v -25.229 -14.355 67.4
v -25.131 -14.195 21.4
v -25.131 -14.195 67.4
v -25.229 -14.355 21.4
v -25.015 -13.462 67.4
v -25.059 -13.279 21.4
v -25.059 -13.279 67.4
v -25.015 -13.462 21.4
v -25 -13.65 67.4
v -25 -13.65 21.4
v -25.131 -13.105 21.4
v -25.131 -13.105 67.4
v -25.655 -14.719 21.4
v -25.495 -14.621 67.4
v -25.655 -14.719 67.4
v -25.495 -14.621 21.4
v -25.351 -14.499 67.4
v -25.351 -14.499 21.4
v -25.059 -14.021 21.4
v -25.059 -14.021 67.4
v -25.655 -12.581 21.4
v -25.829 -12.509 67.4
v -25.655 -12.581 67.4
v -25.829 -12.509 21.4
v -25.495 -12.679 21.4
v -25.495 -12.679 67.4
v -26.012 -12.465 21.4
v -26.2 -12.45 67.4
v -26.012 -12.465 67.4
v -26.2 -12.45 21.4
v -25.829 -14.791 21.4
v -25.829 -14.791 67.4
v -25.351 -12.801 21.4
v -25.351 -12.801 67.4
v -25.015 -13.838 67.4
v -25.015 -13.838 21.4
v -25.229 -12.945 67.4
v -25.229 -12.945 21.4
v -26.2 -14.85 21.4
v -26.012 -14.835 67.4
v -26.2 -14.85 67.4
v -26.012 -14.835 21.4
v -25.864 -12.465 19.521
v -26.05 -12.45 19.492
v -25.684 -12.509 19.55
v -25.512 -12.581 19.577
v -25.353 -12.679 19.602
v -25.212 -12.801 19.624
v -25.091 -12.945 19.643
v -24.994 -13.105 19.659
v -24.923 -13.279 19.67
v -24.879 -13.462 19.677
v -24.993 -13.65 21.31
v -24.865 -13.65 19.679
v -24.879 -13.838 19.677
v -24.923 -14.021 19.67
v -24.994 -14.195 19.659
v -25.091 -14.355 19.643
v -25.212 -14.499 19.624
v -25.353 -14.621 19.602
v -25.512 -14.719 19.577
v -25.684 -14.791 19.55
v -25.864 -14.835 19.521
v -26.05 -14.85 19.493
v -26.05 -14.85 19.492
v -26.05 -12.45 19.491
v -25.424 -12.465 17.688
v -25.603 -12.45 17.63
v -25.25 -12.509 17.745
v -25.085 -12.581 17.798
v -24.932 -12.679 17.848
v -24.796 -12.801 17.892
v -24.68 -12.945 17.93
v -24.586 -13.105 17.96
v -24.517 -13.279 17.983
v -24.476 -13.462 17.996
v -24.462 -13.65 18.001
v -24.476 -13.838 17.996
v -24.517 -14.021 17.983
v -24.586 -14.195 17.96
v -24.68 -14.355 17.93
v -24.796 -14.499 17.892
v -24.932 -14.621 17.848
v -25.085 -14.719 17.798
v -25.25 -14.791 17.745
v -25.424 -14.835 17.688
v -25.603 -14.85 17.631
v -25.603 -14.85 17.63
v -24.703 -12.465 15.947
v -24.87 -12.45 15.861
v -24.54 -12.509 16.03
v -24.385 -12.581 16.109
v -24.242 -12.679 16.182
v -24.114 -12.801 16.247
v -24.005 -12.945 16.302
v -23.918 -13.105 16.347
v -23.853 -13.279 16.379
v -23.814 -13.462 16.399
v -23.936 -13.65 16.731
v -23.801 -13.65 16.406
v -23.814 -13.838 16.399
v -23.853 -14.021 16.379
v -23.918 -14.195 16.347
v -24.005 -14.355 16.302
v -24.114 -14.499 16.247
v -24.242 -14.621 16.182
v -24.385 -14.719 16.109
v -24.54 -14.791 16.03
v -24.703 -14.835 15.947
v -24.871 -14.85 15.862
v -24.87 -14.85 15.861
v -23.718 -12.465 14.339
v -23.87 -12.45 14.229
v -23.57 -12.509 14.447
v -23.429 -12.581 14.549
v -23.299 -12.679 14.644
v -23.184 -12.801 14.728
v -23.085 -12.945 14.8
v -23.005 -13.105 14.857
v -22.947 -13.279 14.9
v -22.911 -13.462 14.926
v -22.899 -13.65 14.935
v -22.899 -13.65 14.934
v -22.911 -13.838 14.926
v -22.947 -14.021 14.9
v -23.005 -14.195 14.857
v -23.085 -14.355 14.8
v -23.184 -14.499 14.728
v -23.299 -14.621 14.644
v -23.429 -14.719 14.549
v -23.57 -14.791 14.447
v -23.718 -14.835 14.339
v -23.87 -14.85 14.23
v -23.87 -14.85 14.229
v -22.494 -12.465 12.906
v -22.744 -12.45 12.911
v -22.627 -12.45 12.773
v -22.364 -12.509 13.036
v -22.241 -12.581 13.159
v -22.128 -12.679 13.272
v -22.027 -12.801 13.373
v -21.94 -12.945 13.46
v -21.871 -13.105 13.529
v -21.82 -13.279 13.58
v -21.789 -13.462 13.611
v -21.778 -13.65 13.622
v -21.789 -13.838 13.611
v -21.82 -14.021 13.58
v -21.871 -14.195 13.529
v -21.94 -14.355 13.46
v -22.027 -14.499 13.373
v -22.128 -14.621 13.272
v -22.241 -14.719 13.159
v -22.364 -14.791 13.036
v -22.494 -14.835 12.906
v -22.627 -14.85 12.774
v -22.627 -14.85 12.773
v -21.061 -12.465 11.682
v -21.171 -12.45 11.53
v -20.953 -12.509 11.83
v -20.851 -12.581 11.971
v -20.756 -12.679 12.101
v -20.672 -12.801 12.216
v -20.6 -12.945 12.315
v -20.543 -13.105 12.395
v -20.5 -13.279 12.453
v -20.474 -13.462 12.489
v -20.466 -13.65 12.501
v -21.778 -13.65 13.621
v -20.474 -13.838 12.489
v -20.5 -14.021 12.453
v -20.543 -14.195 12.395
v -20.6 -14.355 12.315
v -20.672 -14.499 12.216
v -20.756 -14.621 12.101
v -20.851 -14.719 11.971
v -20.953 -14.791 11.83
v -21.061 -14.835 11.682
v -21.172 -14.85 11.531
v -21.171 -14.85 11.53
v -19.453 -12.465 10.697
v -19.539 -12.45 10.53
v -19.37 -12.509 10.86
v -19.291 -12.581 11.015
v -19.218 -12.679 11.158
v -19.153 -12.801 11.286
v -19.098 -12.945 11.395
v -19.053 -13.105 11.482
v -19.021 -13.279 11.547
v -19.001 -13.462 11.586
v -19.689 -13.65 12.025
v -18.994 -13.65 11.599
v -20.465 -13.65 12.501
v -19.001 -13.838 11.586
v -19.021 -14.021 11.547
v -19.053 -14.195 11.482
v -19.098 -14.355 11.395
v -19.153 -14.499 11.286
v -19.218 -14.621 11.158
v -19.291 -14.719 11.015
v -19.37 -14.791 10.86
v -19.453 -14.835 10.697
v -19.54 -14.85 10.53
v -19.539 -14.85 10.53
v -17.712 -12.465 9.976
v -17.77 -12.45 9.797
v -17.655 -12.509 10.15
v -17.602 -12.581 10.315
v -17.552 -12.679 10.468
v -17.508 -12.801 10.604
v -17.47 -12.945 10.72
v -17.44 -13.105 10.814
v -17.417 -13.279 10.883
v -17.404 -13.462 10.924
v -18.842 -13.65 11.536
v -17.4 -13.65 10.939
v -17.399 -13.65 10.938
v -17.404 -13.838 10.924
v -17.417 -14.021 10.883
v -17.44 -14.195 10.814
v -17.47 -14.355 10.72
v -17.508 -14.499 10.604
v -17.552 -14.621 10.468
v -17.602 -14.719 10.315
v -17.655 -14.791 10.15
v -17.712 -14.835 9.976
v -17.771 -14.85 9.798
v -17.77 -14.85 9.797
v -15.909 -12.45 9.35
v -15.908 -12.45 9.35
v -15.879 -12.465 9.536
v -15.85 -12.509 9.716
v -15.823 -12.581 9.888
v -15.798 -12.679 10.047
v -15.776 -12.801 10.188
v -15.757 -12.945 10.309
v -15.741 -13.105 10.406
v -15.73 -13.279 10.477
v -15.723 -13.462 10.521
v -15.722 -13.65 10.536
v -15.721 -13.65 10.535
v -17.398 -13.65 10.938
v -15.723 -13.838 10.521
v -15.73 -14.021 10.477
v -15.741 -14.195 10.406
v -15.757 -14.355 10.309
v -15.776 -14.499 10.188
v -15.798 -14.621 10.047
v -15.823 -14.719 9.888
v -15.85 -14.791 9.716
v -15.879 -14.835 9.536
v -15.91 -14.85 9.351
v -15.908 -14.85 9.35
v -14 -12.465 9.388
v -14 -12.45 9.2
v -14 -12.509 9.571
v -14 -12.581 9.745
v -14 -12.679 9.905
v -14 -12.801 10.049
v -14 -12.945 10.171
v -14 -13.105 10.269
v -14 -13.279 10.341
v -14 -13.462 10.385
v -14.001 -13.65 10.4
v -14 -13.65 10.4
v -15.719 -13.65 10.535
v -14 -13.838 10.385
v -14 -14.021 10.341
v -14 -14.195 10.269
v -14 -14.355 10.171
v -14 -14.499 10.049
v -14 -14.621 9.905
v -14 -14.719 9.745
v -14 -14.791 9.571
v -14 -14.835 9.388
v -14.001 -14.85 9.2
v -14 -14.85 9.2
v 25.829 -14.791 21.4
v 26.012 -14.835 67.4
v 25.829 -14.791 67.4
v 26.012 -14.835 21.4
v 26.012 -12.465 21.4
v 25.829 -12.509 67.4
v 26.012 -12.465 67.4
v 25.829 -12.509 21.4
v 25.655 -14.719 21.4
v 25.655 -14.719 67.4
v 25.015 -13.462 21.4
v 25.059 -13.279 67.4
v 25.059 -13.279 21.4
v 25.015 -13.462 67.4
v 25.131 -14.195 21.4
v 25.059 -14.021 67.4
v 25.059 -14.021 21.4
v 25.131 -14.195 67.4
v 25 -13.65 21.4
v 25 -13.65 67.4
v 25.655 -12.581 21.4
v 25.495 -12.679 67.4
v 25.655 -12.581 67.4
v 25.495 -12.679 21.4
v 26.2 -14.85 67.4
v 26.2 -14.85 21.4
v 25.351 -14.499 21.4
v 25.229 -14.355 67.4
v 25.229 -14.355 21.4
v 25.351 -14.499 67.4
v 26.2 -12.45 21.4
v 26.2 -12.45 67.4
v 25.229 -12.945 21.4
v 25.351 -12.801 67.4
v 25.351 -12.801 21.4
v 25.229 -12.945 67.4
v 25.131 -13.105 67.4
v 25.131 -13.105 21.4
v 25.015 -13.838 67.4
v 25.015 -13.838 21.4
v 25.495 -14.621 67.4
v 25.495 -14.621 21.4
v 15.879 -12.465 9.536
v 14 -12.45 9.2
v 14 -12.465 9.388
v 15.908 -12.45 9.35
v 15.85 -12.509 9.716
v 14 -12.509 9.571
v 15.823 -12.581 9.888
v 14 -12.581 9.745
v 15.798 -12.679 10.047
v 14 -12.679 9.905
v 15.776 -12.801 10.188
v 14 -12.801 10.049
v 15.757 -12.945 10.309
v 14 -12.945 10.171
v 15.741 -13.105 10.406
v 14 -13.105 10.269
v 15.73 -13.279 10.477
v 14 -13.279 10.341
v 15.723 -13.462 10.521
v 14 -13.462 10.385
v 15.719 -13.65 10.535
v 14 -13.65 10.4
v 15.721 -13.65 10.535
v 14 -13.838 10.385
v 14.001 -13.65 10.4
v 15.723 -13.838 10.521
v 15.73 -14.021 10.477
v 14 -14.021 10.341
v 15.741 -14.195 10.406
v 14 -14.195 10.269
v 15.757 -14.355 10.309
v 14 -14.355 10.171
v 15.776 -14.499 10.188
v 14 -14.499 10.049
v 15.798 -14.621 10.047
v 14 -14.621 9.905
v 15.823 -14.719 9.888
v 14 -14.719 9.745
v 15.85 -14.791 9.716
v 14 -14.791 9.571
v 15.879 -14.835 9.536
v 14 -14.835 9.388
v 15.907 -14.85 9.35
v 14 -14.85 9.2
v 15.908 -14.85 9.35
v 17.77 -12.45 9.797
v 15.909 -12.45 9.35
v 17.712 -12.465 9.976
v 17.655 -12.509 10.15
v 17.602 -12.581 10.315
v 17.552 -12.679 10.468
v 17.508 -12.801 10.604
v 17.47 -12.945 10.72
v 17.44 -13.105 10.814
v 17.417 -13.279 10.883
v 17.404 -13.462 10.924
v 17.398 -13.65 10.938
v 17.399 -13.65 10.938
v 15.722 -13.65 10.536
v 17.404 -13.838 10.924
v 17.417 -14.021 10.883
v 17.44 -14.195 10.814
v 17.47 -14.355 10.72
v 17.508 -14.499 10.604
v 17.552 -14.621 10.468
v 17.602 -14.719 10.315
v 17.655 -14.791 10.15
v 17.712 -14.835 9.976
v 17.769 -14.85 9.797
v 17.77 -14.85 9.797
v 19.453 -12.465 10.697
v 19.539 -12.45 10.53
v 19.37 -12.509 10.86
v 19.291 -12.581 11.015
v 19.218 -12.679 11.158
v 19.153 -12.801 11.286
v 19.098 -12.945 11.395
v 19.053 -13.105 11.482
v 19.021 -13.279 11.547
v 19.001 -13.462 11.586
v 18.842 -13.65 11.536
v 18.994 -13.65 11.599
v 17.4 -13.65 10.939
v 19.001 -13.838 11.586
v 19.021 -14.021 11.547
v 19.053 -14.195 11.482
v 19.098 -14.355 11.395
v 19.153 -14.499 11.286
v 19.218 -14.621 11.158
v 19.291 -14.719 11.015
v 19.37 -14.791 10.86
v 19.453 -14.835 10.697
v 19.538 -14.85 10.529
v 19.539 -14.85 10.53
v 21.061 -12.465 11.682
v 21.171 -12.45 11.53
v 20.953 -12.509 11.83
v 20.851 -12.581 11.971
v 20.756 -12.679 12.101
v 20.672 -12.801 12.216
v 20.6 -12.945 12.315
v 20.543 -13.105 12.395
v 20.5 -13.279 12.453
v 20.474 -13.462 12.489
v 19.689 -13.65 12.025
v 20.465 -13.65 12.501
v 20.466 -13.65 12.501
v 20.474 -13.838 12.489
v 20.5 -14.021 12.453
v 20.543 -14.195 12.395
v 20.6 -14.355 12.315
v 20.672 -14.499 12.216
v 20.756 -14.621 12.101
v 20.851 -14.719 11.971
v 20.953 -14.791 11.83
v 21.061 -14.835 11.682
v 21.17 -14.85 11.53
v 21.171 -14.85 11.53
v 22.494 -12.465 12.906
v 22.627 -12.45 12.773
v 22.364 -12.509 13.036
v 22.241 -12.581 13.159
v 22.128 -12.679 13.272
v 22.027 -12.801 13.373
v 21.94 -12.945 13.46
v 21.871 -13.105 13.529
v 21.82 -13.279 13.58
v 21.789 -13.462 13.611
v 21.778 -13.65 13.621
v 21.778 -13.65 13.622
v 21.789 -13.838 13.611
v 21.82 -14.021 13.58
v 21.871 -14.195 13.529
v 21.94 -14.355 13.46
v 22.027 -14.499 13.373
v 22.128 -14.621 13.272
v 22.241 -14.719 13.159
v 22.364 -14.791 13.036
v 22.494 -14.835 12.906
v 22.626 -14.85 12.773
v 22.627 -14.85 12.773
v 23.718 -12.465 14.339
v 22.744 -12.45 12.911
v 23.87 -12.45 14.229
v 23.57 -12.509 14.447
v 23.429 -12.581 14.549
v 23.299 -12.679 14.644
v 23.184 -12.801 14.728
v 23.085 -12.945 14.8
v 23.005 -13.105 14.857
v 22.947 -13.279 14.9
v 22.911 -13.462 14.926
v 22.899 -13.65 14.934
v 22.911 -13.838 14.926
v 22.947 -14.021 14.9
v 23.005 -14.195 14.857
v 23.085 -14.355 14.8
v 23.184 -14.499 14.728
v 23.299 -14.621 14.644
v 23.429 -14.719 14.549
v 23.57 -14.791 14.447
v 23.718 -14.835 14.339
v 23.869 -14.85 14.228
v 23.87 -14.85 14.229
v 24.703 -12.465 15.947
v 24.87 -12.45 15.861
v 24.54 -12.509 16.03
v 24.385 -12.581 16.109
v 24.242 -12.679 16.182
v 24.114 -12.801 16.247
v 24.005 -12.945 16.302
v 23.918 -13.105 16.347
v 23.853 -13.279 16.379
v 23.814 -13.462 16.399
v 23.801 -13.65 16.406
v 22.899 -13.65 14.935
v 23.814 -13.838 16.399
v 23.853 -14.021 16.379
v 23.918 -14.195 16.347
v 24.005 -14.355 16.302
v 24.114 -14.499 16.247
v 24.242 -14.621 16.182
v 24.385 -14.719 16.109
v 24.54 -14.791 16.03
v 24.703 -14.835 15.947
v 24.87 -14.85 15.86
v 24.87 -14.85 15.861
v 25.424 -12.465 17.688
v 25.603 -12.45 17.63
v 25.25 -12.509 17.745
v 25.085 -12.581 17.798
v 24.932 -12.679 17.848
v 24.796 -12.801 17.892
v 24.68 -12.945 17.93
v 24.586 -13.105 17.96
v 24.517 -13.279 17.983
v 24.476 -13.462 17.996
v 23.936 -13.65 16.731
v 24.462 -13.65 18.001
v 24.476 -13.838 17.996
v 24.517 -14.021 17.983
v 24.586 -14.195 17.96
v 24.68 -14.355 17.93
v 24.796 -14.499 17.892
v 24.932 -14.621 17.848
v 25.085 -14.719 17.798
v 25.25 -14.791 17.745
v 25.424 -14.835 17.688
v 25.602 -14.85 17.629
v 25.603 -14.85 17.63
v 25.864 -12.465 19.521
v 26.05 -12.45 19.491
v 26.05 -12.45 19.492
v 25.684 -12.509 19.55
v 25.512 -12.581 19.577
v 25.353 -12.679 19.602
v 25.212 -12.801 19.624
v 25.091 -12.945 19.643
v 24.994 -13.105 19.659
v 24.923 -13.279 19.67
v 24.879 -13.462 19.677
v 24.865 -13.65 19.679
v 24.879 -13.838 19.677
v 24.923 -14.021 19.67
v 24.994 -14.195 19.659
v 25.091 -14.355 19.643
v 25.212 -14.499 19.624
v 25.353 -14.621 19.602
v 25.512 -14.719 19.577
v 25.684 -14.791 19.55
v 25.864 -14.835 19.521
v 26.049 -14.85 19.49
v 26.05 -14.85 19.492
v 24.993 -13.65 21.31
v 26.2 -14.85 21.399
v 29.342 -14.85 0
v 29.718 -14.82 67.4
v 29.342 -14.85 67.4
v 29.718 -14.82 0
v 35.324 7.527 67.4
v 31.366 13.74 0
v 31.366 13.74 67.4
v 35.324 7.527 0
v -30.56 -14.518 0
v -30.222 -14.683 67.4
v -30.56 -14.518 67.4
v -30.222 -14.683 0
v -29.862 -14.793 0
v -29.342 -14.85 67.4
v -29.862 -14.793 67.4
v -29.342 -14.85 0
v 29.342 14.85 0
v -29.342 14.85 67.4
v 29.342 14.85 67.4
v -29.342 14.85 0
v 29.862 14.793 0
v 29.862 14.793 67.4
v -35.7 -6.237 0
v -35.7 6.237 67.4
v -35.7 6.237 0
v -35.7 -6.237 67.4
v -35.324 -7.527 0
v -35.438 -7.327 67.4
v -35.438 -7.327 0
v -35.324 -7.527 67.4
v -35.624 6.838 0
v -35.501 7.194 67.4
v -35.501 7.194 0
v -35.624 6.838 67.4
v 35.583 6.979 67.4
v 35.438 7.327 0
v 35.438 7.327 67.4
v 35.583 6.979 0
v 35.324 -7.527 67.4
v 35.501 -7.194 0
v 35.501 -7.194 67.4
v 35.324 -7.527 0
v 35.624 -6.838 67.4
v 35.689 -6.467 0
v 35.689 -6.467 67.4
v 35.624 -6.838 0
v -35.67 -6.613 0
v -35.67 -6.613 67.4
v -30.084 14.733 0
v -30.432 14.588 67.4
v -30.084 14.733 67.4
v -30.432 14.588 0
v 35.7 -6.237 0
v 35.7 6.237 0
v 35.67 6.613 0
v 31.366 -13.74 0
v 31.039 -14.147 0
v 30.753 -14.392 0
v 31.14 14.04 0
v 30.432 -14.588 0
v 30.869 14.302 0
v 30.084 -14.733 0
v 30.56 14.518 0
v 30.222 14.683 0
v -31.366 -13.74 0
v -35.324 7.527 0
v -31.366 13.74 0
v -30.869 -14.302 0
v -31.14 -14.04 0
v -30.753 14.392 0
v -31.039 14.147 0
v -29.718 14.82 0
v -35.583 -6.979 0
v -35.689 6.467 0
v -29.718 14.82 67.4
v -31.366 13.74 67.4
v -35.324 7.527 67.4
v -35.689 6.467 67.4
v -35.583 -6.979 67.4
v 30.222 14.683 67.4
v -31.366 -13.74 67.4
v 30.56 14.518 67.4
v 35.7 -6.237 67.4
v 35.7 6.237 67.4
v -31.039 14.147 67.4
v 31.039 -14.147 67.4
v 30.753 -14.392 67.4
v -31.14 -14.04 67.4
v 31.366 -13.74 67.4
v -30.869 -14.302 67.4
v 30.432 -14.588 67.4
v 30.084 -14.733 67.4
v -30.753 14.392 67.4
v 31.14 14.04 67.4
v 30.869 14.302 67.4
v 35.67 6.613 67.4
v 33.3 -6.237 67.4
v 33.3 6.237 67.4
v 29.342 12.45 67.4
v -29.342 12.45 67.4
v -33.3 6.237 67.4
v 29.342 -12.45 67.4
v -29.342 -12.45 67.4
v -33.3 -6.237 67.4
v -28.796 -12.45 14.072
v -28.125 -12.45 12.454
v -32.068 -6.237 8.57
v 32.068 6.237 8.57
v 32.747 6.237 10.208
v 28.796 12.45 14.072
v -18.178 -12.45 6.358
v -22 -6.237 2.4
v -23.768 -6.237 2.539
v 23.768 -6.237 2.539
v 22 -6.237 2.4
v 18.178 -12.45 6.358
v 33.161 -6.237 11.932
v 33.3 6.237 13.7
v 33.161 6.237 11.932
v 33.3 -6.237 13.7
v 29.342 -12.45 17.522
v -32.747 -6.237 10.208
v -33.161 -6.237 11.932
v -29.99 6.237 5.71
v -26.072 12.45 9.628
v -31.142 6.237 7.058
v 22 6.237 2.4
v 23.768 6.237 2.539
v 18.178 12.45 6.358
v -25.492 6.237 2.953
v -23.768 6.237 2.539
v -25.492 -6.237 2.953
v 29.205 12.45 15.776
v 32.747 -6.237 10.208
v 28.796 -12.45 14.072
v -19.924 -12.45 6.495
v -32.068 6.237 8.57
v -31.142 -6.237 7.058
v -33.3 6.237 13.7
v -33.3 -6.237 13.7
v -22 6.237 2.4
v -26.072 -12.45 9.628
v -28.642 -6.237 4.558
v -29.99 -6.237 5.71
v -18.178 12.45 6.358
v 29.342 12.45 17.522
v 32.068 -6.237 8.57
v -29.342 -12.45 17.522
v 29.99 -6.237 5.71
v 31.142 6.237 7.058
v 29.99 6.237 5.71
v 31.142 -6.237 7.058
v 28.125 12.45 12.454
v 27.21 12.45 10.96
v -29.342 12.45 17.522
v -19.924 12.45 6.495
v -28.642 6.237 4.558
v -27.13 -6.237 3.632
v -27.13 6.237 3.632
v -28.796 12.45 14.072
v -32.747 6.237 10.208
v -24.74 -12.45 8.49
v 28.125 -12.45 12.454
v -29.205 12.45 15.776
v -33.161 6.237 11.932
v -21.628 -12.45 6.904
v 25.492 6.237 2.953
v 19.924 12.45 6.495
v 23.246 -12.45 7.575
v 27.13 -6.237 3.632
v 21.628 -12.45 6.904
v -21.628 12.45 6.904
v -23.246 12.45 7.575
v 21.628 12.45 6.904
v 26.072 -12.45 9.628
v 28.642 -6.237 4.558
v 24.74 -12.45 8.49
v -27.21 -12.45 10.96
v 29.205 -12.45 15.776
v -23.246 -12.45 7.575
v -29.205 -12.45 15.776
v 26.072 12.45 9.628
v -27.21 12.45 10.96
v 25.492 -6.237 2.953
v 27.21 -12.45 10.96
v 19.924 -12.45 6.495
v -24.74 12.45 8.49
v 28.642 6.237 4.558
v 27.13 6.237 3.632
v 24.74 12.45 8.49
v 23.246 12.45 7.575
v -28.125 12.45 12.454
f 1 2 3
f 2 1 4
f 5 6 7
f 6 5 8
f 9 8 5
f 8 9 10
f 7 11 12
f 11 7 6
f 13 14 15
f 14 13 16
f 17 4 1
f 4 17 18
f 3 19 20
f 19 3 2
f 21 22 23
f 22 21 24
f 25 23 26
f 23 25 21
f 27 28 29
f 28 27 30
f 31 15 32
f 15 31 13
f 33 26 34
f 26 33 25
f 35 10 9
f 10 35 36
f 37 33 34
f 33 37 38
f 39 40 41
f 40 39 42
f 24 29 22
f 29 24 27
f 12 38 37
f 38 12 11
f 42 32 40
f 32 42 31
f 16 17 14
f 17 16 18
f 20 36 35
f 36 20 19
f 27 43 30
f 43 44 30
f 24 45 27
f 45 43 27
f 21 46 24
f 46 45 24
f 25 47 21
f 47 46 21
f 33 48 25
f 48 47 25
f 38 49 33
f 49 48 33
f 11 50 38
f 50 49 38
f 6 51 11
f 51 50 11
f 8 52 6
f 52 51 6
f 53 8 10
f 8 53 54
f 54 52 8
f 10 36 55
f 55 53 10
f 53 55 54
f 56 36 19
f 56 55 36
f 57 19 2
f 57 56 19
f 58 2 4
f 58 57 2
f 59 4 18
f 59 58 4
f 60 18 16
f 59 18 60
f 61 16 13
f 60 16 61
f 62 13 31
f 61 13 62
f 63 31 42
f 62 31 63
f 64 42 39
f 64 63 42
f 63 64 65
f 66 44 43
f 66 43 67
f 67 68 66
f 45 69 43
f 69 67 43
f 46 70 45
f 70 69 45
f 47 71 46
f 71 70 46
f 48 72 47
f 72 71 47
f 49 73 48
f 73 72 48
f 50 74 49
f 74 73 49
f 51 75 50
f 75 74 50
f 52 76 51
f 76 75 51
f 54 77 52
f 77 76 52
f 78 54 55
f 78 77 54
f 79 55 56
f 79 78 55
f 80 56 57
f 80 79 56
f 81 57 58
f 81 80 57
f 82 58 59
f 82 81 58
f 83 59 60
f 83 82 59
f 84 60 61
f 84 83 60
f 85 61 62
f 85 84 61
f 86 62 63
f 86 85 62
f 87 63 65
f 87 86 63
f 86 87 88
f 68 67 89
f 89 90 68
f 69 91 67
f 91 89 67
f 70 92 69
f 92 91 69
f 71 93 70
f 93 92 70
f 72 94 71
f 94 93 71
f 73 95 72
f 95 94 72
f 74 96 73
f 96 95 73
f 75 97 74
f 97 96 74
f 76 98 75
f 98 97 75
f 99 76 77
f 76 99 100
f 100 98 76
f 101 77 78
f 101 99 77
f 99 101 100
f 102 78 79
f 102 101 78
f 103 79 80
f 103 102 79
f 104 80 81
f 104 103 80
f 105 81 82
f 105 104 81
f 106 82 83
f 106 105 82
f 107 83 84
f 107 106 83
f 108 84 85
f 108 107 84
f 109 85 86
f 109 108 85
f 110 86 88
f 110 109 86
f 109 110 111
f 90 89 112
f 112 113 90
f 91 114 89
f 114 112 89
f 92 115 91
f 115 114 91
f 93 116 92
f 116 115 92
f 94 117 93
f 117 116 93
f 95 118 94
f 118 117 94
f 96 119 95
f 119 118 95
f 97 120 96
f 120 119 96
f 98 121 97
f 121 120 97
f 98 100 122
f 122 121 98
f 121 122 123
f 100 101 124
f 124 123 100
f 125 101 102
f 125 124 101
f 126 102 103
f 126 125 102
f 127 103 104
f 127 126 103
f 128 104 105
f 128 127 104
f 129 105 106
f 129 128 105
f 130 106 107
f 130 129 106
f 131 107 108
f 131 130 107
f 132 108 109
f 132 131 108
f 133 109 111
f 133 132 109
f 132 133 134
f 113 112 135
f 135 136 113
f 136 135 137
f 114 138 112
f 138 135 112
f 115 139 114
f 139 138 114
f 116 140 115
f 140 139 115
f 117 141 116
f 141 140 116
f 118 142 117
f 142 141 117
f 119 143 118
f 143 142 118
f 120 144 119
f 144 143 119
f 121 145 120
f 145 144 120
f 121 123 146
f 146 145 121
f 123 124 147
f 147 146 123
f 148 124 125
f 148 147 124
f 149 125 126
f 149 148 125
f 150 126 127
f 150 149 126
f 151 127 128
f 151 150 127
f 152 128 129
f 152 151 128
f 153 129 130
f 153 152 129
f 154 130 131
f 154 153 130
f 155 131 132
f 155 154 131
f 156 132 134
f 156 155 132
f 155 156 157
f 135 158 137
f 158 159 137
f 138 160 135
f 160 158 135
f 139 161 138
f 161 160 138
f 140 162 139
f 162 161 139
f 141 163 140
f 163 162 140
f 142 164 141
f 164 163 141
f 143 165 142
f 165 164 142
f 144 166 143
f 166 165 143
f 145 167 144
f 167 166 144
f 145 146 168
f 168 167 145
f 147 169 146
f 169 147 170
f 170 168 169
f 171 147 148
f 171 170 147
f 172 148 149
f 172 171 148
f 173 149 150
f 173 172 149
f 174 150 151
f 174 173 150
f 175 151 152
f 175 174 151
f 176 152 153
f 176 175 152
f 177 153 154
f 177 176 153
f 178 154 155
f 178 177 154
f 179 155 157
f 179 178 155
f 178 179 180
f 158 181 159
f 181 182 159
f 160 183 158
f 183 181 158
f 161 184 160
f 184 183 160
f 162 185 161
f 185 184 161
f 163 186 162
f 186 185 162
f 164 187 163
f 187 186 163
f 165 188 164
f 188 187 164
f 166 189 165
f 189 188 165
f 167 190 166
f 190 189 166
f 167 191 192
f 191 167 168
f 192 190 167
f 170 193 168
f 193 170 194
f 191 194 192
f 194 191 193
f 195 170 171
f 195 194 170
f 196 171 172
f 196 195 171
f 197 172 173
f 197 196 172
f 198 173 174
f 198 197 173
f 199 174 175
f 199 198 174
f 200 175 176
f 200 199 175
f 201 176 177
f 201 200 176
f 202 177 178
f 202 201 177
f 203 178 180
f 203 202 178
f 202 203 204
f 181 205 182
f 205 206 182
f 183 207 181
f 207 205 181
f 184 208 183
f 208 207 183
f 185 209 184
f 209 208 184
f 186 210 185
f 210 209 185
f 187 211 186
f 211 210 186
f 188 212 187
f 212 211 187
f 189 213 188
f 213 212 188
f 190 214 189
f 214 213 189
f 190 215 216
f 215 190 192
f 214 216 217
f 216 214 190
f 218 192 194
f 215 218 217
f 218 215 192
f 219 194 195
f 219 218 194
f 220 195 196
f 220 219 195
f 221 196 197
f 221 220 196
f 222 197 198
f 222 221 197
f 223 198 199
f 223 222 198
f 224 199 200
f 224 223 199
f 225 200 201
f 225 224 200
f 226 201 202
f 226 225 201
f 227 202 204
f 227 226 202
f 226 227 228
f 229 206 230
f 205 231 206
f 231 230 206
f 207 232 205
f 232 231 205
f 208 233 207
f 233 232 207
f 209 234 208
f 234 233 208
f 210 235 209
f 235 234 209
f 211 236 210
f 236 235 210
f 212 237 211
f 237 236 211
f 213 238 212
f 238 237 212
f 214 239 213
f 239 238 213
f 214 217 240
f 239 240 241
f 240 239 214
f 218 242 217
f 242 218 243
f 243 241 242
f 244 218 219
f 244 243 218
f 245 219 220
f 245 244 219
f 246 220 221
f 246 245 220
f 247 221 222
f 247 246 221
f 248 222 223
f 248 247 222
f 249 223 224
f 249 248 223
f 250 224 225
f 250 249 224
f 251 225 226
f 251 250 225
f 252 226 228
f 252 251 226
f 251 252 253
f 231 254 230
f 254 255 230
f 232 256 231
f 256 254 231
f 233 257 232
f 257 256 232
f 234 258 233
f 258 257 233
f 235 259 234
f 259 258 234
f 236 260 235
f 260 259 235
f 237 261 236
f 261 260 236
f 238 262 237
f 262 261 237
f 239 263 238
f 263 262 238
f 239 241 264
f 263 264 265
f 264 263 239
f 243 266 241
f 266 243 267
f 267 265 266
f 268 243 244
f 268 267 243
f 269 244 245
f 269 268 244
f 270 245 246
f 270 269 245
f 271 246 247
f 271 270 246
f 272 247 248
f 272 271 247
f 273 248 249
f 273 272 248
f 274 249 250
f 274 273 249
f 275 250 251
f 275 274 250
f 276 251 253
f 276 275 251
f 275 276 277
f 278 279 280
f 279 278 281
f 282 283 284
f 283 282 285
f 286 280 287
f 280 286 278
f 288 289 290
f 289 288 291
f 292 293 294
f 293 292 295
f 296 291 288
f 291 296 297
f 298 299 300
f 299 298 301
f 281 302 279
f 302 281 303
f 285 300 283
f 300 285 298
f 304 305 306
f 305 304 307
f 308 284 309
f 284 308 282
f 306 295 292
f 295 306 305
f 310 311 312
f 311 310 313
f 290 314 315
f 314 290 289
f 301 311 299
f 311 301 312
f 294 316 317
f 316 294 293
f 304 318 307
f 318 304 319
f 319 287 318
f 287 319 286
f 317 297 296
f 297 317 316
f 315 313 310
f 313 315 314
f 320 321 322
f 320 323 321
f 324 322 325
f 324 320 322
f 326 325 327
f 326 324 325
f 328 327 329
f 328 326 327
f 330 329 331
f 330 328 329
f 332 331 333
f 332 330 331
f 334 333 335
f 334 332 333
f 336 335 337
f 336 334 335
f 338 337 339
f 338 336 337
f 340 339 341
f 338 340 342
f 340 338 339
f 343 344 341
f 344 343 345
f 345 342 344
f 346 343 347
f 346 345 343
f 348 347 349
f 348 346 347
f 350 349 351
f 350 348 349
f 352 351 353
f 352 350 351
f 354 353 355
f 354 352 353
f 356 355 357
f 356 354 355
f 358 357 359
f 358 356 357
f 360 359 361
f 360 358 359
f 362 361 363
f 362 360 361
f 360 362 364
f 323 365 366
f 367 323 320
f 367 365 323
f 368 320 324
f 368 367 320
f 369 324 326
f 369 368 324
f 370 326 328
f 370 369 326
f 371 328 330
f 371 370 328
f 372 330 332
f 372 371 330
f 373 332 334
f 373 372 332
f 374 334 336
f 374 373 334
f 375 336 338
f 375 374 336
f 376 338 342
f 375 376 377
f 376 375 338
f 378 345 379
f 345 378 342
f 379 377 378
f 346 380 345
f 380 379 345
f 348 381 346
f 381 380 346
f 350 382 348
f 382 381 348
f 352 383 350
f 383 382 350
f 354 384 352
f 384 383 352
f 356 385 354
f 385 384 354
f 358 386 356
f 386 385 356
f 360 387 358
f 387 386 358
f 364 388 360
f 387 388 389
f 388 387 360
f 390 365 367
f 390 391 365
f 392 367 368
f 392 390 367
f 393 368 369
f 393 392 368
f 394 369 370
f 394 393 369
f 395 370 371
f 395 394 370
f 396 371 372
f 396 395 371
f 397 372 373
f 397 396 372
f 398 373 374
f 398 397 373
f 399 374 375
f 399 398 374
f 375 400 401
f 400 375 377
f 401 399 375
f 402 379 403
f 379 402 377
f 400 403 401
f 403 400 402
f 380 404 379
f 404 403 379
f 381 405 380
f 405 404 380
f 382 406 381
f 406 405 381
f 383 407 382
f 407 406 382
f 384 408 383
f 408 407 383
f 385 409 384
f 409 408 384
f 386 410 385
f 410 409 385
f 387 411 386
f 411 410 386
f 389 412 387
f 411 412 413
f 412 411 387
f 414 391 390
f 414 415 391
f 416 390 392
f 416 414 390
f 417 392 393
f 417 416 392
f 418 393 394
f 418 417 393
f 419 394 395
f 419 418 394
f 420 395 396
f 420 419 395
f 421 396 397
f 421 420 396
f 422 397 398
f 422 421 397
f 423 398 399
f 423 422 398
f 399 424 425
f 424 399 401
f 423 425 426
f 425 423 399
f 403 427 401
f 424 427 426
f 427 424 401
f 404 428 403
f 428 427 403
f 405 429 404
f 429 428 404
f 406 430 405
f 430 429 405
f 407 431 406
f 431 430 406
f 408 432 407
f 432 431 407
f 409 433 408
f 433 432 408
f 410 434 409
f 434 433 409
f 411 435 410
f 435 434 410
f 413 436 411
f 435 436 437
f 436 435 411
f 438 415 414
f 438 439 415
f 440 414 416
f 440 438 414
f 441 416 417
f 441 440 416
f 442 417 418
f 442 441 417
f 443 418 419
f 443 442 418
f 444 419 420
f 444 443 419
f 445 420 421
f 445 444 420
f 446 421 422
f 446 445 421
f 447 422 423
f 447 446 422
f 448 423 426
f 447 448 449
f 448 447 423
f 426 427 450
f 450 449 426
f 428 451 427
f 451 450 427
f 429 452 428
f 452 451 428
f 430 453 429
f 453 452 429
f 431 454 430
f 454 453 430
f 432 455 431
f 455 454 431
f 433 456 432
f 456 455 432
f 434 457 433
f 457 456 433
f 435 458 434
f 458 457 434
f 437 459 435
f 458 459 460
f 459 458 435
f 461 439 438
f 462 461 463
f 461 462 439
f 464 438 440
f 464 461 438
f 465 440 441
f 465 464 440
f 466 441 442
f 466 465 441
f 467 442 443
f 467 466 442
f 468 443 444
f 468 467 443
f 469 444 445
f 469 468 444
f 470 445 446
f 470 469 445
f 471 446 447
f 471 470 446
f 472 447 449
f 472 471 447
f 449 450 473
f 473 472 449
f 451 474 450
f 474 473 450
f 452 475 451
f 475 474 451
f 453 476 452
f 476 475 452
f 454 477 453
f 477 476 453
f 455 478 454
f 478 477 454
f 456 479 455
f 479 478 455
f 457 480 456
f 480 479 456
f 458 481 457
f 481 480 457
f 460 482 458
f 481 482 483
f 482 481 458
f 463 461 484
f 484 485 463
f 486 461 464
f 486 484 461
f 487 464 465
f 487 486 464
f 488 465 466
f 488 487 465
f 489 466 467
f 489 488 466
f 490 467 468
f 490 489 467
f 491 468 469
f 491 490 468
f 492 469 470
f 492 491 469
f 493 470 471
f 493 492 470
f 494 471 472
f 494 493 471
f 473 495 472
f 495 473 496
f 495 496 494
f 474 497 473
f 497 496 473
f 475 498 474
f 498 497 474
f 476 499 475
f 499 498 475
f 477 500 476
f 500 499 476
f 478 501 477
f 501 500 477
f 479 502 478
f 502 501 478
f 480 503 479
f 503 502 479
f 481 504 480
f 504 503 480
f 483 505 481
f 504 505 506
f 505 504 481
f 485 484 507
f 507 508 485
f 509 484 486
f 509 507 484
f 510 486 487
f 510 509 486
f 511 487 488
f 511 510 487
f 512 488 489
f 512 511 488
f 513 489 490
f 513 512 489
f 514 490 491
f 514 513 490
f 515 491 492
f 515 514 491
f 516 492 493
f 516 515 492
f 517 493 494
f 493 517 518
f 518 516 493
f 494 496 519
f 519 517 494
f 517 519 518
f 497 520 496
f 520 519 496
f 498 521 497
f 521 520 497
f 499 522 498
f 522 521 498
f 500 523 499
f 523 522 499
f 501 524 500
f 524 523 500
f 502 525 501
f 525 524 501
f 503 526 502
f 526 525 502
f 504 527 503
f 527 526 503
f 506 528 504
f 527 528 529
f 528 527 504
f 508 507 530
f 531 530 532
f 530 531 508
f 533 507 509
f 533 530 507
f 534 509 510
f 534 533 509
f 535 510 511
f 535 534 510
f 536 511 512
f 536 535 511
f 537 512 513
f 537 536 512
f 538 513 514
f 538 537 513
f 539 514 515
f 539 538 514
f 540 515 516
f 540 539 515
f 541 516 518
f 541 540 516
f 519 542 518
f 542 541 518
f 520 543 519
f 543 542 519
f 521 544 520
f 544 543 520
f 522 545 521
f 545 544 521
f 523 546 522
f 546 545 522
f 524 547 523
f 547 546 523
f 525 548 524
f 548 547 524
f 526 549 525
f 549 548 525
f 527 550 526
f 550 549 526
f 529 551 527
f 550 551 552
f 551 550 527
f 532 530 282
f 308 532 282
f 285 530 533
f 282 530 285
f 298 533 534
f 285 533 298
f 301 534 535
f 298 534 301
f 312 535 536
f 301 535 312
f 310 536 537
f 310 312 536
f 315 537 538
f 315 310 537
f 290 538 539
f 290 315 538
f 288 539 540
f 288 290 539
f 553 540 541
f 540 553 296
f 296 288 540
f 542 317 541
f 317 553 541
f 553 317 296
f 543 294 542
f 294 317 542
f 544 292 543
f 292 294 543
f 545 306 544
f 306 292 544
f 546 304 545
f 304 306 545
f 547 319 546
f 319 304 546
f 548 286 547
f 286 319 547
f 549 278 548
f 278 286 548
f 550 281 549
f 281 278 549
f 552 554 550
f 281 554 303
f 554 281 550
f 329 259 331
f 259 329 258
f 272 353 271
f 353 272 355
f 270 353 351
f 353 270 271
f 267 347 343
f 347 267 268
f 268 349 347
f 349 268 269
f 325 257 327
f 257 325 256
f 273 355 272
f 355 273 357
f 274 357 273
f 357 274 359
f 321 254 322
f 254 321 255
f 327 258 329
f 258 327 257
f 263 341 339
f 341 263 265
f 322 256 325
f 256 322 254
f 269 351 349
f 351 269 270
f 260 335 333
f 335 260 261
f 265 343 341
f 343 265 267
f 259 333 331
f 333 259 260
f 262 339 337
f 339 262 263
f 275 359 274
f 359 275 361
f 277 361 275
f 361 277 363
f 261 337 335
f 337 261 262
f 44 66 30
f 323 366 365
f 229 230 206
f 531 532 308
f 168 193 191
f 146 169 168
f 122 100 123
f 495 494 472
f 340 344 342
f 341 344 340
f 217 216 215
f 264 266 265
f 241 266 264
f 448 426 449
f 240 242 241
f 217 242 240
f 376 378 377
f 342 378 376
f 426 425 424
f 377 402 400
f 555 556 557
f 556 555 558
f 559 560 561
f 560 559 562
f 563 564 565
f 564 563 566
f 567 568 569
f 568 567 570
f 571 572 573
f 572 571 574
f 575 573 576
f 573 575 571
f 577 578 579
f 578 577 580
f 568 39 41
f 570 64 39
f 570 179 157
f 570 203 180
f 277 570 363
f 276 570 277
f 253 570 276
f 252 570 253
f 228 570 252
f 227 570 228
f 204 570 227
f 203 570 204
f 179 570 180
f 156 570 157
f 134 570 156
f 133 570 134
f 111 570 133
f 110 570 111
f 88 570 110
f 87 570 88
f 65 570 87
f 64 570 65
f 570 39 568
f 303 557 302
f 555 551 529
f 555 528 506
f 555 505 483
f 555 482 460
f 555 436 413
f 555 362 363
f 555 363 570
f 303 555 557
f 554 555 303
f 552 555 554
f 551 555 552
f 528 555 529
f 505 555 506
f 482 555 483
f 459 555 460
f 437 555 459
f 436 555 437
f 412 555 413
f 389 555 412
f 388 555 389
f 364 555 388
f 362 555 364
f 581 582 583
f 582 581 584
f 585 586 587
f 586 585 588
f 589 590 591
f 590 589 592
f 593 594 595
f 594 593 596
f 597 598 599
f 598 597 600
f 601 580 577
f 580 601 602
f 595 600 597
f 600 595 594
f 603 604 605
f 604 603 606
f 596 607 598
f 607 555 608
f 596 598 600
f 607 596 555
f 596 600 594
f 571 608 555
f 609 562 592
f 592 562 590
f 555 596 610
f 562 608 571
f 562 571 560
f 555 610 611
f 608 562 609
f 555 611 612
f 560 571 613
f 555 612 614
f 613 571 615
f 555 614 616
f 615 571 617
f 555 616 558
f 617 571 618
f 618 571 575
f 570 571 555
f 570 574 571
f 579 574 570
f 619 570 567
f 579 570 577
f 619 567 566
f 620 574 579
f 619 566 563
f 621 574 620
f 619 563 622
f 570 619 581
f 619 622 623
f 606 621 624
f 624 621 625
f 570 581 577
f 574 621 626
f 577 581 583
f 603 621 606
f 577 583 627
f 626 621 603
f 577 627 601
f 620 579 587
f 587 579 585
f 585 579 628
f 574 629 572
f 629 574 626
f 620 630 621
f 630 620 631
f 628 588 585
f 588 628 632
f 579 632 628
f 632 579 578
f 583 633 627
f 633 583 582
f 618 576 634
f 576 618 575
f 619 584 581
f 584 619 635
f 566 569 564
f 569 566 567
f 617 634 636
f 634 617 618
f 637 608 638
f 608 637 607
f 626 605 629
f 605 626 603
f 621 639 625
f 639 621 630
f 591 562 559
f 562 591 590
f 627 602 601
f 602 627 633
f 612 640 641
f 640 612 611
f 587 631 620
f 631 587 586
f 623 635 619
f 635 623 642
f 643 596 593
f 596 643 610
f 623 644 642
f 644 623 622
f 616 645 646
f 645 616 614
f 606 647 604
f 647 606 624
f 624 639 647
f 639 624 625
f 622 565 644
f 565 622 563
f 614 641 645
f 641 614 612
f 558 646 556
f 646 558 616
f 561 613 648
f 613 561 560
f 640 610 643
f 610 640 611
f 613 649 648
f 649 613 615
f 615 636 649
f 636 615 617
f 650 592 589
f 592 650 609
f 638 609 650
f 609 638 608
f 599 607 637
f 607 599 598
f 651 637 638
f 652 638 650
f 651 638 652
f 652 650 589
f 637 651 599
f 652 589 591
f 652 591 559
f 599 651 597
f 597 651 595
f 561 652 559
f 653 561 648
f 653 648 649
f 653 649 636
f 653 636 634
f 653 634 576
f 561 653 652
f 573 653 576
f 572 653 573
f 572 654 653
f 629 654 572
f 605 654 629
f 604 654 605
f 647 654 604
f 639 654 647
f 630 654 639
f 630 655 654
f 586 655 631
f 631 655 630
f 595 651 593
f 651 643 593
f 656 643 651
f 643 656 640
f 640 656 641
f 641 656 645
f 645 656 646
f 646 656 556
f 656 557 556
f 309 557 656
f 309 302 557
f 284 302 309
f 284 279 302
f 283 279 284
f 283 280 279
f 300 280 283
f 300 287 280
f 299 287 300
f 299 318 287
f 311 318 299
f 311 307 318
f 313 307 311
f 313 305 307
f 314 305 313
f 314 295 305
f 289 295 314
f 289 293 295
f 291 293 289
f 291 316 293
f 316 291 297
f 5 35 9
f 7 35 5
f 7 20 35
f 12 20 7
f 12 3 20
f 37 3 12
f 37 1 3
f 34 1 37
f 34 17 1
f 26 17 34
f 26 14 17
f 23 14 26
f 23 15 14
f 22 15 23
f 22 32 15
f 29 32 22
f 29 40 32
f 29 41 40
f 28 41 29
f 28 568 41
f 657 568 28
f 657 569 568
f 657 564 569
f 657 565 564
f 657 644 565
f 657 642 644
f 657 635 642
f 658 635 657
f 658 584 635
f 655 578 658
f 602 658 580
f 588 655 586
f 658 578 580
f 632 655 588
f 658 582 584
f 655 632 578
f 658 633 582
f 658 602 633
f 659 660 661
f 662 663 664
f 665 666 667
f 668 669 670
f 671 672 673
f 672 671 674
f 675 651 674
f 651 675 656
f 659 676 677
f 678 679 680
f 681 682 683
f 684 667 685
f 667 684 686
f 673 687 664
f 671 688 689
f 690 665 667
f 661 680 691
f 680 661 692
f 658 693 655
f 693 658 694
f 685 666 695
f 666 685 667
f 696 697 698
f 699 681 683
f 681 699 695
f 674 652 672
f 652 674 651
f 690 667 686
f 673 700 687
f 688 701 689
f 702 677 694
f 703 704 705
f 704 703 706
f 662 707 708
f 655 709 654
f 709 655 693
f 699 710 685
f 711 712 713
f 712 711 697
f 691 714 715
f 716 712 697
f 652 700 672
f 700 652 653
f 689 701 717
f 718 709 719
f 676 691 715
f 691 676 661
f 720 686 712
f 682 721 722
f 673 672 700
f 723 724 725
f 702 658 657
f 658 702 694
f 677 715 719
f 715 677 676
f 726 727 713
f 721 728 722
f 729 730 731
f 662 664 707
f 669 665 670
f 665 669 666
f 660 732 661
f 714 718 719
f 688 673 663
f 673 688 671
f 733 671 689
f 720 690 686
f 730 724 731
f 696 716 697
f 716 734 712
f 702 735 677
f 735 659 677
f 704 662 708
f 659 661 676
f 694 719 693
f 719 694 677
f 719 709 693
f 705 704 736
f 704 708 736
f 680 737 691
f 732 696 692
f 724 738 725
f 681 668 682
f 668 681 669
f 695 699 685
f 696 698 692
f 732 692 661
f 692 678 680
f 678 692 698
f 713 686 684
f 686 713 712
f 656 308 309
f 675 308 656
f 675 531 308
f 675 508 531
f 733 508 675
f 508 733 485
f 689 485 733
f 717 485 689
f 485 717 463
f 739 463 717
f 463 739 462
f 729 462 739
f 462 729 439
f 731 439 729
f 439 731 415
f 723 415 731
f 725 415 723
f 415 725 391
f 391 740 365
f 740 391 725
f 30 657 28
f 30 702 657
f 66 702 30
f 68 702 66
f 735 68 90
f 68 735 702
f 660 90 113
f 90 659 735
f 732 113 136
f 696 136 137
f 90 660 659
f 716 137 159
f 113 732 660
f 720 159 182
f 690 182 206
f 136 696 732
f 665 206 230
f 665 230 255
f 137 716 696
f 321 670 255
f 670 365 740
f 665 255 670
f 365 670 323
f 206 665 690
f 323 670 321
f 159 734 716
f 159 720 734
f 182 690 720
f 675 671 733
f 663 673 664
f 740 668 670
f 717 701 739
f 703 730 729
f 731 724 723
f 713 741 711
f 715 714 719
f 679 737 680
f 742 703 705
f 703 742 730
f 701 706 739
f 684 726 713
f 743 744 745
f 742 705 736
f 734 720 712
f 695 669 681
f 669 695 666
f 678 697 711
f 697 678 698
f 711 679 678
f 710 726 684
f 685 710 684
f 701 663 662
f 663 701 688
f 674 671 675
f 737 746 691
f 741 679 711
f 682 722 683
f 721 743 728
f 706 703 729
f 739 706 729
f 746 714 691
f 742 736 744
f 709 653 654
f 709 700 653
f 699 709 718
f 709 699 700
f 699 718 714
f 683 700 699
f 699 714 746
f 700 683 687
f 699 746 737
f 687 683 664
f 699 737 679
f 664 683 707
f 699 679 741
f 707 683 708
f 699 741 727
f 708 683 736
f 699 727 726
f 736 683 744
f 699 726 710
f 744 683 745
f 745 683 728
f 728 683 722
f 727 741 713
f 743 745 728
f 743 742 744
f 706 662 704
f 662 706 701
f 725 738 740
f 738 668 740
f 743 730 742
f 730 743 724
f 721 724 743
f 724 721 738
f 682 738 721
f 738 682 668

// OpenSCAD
// file: ../lib/meshology-l1-holster-lib.scad
// Meshology L1 holster: a TPU channel the radio slides down into.
// X is side to side, Y front (-) to back (+), Z up. The holster prints
// standing on its floor, open top up, so every wall is vertical.

// BEGIN_PARAMS
// Radio, front face to back face
radio_thickness = 24.3;
// Radio, side to side
radio_width = 66;
// Radio body height, bottom to top
radio_height = 78;
// Inside angle between the front face and a diagonal face (degrees)
radio_corner_angle = 122.5;
// How far each diagonal face reaches front-to-back (not measured yet).
// The front and back faces are bevelled the same way on all four edges.
radio_chamfer_depth = 6;
// Radius of the body's four corners seen from the front; the front and
// back faces' corners share their centres
radio_corner_radius = 11;
// Gap between radio and holster, per side
tolerance = 0.3;
// Wall, back and floor thickness
wall = 2.4;
// Inside depth of the channel, floor to rim
pocket_depth = 65;
// How far the front walls reach in from the radio's sides
front_lip = 8;
// Front wall left standing above the floor
front_sill = 8;
// Radius of the front cutout's lower corners, matching the radio's
cutout_corner_radius = 11;
// END_PARAMS

// The diagonal face rises radio_chamfer_depth over this much width.
radio_chamfer_width = radio_chamfer_depth / tan(180 - radio_corner_angle);

assert(radio_chamfer_depth * 2 < radio_thickness, "diagonal faces would meet front to back");
assert(radio_chamfer_width * 2 < radio_width, "diagonal faces would meet side to side");
assert(radio_corner_radius > radio_chamfer_width, "face corners would be sharper than a point");
assert(radio_corner_radius * 2 < radio_width - 2 * radio_chamfer_width, "face corners would meet side to side");
assert(front_lip > radio_chamfer_width, "front lip must reach past the diagonal face onto the front face");
assert(front_lip * 2 < radio_width, "front lips would close the front");
assert(cutout_corner_radius <= pocket_depth - front_sill, "cutout corner taller than the cutout");

module radio_outline() {
  w = radio_width / 2;
  t = radio_thickness / 2;
  cw = radio_chamfer_width;
  c = radio_chamfer_depth;
  polygon([
    [-w + cw, -t], [w - cw, -t], [w, -t + c], [w, t - c],
    [w - cw, t], [-w + cw, t], [-w, t - c], [-w, -t + c]
  ]);
}

module pocket_outline() {
  offset(delta = tolerance) radio_outline();
}

// [width, depth] of a bevel after its body grows by d on every face.
function grown_bevel(cw, c, d) =
  let (a = atan(c / cw), e = cw * sin(a) + d * (sin(a) + cos(a) - 1))
  [e / sin(a), e / cos(a)];

// The radio grown by d on every face, bottom at z = 0. Seen from the front
// its outline and its front and back faces are rounded rectangles whose
// corners share centres, so the bevel is the same width all round. It's a
// hull of one cylinder per corner: the outline's spanning the full-width
// band, and a thin one at each face. stretch lifts the top corners, to
// open a channel above the radio.
module radio_body(d = 0, stretch = 0) {
  r = radio_corner_radius;
  cw = radio_chamfer_width;
  bev = grown_bevel(cw, radio_chamfer_depth, d);
  t = radio_thickness / 2 + d;
  face_r = r + d + cw - bev[0];
  band = 2 * (t - bev[1]);
  hull() {
    for (sx = [-1, 1], z = [r, radio_height - r + stretch]) {
      translate([sx * (radio_width / 2 - r), -band / 2, z])
        rotate([-90, 0, 0]) cylinder(r = r + d, h = band);
    }
    for (sx = [-1, 1], z = [cw + r, radio_height - cw - r + stretch], y = [-t, t - 0.01]) {
      translate([sx * (radio_width / 2 - cw - r), y, z])
        rotate([-90, 0, 0]) cylinder(r = face_r, h = 0.01);
    }
  }
}

// Grown down by the clearance too, so the floor sits tolerance under
// the radio; the top runs past the rim so the channel stays open.
module pocket() {
  translate([0, 0, wall + tolerance])
    radio_body(tolerance, pocket_depth);
}

cutout_half = radio_width / 2 - front_lip;
cutout_bottom = wall + front_sill;
cutout_top = wall + pocket_depth + 1;
// Mid-plane of the flat front wall, where the cutout's edge runs.
front_wall_mid = -(radio_thickness / 2 + tolerance + wall / 2);
// The cutout's edge is rounded in a full half-round across the wall.
cutout_edge_radius = wall / 2;

// The cutout seen from the front, in (x, z), grown by g.
module cutout_profile(g = 0) {
  r = cutout_corner_radius;
  hull() {
    for (x = [-cutout_half + r, cutout_half - r]) translate([x, cutout_bottom + r]) circle(r = r + g);
    translate([-cutout_half - g, cutout_bottom + r]) square([2 * (cutout_half + g), cutout_top - cutout_bottom - r]);
  }
}

// Cut from outside the front wall back to y_end, toward the back.
module cutout_through(g, y_end) {
  y0 = -radio_thickness / 2 - tolerance - wall - 1;
  translate([0, y_end, 0]) rotate([90, 0, 0]) linear_extrude(y_end - y0) cutout_profile(g);
}

// A round rod along the cutout's edge, one edge-radius in from it, in the
// wall's mid-plane: what the edge rounds to.
module cutout_edge_rod() {
  r = cutout_corner_radius;
  e = cutout_edge_radius;
  cz = cutout_bottom + r;
  for (sx = [-1, 1]) {
    translate([sx * (cutout_half + e), front_wall_mid, cz]) cylinder(r = e, h = cutout_top - cz);
    translate([sx * (cutout_half - r), front_wall_mid, cz])
      rotate([90, 0, 0]) rotate([0, 0, sx < 0 ? 180 : 270])
        rotate_extrude(angle = 90) translate([r + e, 0]) circle(r = e);
  }
  translate([-(cutout_half - r), front_wall_mid, cutout_bottom - e])
    rotate([0, 90, 0]) cylinder(r = e, h = 2 * (cutout_half - r));
}

module front_cutout() {
  cutout_through(0, radio_thickness / 2);
  // The band within an edge-radius of the opening, through the wall,
  // less the rod it rounds to.
  difference() {
    cutout_through(cutout_edge_radius, -radio_thickness / 2 - tolerance + 0.5);
    cutout_edge_rod();
  }
}

module holster() {
  difference() {
    linear_extrude(wall + pocket_depth)
      offset(r = wall) pocket_outline();
    pocket();
    front_cutout();
  }
}

// Reference body for the preview: the radio seated on the floor.
module radio() {
  translate([0, 0, wall + tolerance]) radio_body();
}
// main file
include <../lib/meshology-l1-holster-lib.scad>;
$fn = 40;
holster();
